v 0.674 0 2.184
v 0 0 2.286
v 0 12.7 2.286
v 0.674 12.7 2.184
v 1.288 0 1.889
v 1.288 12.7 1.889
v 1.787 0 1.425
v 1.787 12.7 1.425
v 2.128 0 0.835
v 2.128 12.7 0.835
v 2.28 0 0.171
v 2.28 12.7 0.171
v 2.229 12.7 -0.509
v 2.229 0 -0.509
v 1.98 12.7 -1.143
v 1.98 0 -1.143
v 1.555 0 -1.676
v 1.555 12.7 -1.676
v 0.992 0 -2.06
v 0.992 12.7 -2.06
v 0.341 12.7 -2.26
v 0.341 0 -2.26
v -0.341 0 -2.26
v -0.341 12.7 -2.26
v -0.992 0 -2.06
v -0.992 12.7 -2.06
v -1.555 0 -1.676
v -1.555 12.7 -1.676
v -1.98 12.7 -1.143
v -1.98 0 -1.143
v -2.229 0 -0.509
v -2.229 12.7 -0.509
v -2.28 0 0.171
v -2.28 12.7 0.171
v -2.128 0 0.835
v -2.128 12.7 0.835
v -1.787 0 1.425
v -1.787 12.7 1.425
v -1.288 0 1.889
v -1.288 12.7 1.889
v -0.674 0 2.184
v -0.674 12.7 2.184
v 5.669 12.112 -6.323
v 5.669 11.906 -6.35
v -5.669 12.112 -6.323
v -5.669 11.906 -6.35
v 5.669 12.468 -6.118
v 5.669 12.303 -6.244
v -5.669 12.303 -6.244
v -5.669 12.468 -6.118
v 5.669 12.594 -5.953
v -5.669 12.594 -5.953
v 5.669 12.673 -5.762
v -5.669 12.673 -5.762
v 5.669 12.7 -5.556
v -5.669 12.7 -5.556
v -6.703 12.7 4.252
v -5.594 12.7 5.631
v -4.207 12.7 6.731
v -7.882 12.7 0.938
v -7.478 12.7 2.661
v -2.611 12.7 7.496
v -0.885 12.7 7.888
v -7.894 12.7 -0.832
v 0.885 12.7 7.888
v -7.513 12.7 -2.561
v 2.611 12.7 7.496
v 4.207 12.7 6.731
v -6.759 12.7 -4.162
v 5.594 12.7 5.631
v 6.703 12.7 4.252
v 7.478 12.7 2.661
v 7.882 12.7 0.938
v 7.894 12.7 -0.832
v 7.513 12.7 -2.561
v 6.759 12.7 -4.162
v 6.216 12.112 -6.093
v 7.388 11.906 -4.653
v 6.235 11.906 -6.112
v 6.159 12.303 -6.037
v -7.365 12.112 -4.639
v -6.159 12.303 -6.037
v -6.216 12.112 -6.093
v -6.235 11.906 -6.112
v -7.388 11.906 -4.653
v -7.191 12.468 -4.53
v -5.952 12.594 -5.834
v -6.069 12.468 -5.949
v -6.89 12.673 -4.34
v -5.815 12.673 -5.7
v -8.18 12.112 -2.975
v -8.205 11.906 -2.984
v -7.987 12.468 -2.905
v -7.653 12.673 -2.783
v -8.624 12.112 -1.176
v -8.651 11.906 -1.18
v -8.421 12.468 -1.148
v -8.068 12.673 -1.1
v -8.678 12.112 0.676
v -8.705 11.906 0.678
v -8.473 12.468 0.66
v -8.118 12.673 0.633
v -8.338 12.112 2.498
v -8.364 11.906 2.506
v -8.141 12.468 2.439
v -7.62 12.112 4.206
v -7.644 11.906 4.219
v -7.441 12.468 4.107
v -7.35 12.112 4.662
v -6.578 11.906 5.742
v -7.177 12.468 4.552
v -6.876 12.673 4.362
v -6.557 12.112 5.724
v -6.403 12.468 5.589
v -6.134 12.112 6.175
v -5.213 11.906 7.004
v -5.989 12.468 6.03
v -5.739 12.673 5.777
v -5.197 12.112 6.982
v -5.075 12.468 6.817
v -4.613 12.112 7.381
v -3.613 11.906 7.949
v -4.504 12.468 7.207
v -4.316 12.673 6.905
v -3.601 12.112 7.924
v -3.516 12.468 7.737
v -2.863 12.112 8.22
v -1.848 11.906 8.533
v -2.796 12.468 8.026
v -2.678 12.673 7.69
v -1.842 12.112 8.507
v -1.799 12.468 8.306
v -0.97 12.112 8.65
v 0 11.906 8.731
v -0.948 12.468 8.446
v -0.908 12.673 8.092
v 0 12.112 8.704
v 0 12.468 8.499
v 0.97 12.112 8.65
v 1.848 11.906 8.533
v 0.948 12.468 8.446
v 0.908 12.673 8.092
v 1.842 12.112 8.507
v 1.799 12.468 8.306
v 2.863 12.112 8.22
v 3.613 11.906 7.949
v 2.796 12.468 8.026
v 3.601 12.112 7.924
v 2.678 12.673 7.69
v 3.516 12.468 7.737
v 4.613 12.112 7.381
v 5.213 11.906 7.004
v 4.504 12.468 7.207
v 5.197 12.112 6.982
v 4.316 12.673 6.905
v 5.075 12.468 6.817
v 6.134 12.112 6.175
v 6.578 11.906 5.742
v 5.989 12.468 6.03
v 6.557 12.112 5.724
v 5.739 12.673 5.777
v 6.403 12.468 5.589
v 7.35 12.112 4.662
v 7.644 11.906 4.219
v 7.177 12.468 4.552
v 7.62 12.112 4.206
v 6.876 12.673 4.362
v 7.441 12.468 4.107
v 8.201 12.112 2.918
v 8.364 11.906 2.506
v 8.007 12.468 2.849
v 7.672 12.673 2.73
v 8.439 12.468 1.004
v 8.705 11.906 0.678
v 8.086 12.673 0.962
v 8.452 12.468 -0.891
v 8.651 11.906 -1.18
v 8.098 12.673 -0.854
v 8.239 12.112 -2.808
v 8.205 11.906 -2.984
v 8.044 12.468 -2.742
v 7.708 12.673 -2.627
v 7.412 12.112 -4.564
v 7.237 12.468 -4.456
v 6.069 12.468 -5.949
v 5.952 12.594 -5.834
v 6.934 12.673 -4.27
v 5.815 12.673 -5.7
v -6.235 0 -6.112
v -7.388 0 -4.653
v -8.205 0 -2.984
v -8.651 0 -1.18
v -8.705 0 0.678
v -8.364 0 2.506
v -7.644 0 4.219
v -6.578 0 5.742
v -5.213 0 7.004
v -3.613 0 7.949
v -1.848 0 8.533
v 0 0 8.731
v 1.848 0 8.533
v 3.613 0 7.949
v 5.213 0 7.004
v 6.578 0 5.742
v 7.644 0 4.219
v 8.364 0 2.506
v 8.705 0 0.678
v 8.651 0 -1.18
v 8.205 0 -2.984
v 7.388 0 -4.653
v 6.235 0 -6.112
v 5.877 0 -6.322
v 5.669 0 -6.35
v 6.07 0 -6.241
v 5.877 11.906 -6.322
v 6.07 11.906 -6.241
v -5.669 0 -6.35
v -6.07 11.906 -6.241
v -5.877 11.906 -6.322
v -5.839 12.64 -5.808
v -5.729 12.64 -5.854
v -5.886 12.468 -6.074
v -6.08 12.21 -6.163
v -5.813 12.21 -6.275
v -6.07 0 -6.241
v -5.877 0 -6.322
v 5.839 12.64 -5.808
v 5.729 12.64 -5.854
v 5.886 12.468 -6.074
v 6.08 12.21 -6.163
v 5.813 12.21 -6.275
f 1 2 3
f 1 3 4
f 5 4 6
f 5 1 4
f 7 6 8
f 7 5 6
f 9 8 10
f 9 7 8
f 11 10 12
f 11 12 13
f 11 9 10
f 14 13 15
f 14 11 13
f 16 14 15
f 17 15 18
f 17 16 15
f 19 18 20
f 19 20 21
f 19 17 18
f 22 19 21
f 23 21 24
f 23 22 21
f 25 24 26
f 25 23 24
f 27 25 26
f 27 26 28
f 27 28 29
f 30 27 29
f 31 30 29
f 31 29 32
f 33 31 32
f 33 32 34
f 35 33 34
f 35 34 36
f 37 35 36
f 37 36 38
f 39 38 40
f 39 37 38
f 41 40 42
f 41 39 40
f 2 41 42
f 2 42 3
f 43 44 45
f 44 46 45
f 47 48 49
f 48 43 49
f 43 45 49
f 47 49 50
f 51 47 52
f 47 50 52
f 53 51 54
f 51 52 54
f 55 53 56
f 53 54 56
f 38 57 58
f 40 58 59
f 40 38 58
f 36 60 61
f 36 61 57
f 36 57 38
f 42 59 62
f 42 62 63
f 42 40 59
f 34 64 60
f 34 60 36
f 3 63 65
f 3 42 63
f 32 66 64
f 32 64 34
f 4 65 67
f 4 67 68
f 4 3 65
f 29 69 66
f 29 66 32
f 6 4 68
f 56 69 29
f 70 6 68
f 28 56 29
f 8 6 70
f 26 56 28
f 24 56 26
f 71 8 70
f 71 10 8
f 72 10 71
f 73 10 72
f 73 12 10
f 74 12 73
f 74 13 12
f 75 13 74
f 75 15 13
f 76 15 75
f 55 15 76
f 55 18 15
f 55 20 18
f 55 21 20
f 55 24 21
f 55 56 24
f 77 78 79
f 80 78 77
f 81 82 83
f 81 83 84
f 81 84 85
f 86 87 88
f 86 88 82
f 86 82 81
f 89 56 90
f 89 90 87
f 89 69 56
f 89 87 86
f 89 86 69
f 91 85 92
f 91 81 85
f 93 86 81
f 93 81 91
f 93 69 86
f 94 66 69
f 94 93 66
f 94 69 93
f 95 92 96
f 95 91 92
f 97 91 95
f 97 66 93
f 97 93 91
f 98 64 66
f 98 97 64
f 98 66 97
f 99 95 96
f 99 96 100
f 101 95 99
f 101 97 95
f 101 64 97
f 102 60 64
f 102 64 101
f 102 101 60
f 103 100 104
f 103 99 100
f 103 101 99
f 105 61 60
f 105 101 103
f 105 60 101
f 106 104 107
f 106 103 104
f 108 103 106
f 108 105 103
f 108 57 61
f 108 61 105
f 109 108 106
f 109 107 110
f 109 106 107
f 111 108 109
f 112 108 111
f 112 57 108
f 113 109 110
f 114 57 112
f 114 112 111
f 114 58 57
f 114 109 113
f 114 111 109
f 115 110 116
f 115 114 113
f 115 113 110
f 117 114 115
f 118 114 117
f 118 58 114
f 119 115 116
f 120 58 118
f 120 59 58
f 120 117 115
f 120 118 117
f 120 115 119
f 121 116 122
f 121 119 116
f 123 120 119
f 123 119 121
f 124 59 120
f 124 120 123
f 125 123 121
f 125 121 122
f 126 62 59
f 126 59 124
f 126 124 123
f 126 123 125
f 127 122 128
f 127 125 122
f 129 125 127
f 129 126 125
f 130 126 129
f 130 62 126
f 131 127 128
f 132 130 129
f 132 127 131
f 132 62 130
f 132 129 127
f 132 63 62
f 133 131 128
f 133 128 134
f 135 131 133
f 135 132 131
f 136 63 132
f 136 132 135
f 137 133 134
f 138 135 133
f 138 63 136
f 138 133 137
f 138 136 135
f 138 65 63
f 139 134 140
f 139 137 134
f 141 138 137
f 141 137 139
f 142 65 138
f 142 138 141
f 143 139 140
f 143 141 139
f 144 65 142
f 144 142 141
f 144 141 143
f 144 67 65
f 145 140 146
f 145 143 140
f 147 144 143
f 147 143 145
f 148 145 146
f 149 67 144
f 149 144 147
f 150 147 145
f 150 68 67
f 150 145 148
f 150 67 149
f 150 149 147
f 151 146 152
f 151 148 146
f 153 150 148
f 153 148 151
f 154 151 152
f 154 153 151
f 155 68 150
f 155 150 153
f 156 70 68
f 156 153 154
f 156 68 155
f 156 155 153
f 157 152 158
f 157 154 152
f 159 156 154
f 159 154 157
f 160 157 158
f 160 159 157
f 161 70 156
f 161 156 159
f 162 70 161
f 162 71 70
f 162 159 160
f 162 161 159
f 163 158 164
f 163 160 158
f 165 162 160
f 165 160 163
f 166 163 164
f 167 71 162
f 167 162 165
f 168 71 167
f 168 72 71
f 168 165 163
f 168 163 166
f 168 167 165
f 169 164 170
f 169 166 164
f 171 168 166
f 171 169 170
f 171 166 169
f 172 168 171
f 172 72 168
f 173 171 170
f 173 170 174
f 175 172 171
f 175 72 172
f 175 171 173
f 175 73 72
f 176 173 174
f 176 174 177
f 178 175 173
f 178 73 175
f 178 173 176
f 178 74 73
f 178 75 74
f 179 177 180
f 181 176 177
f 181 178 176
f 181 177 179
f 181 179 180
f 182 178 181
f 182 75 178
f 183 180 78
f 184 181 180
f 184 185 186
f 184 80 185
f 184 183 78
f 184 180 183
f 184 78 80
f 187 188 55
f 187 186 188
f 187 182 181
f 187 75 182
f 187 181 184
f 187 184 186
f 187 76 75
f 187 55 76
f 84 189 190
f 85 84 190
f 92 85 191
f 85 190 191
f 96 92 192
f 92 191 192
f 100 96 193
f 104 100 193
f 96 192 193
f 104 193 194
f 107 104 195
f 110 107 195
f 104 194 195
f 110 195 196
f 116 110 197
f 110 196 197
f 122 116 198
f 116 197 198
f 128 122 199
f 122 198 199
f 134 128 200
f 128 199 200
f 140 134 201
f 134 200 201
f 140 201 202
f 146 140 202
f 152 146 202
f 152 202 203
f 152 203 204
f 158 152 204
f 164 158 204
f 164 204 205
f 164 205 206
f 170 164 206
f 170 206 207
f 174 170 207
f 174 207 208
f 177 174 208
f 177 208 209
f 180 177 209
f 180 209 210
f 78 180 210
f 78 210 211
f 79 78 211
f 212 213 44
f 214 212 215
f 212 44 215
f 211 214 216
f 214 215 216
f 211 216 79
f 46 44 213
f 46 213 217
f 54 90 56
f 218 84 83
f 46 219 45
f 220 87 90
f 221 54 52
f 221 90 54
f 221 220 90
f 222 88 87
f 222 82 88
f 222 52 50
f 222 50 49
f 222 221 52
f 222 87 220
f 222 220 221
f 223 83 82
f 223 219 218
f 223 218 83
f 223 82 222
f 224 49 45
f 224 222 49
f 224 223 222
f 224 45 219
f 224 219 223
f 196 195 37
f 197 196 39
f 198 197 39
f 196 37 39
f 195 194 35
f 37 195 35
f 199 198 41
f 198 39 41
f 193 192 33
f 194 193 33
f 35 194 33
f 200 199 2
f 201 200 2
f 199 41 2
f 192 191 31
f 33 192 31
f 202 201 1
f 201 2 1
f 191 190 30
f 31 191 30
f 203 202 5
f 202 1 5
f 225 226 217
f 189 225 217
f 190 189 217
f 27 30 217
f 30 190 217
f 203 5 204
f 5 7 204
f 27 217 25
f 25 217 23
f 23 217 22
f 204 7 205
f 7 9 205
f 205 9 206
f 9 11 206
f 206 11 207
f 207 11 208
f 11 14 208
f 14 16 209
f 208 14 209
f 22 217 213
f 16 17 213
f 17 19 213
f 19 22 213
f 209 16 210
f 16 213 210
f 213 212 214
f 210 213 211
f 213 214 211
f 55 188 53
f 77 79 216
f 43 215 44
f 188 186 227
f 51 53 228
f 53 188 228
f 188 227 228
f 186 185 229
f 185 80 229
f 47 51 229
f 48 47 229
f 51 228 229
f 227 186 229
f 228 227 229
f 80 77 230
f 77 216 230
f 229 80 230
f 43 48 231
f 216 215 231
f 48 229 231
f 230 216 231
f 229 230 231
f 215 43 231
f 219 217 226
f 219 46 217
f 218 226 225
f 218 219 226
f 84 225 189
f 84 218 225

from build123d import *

# Parameters (mm, degrees)
SKETCH1_R           = 2.286
BOSS_EXTRUDE1_DEPTH = 12.7
FILLET1_R           = 0.79375


with BuildPart() as part:
    # Sketch1 → Boss-Extrude1 (new body)
    with BuildSketch(Plane(origin=(0, 0, 0), x_dir=(1, 0, 0), z_dir=(0, 1, 0))):
        with BuildLine():
            Line((5.992681083, 6.35), (-5.992681083, 6.35))
            ThreePointArc((-5.992681083, 6.35), (0, -8.73125), (5.992681083, 6.35))
        make_face()
        with Locations(Location((0, 0, 0), (0, 0, 270))):
            Circle(SKETCH1_R, mode=Mode.SUBTRACT)
    extrude(amount=BOSS_EXTRUDE1_DEPTH)

    # Fillet1
    fillet1_edges = [part.edges().sort_by_distance(p)[0] for p in [
        (-5.992681083, 6.35, -6.35),
        (5.992681083, 6.35, -6.35),
        (0, 12.7, 8.73125),
        (0, 12.7, -6.35),
    ]]
    fillet(fillet1_edges, radius=FILLET1_R)


solid = part.part
